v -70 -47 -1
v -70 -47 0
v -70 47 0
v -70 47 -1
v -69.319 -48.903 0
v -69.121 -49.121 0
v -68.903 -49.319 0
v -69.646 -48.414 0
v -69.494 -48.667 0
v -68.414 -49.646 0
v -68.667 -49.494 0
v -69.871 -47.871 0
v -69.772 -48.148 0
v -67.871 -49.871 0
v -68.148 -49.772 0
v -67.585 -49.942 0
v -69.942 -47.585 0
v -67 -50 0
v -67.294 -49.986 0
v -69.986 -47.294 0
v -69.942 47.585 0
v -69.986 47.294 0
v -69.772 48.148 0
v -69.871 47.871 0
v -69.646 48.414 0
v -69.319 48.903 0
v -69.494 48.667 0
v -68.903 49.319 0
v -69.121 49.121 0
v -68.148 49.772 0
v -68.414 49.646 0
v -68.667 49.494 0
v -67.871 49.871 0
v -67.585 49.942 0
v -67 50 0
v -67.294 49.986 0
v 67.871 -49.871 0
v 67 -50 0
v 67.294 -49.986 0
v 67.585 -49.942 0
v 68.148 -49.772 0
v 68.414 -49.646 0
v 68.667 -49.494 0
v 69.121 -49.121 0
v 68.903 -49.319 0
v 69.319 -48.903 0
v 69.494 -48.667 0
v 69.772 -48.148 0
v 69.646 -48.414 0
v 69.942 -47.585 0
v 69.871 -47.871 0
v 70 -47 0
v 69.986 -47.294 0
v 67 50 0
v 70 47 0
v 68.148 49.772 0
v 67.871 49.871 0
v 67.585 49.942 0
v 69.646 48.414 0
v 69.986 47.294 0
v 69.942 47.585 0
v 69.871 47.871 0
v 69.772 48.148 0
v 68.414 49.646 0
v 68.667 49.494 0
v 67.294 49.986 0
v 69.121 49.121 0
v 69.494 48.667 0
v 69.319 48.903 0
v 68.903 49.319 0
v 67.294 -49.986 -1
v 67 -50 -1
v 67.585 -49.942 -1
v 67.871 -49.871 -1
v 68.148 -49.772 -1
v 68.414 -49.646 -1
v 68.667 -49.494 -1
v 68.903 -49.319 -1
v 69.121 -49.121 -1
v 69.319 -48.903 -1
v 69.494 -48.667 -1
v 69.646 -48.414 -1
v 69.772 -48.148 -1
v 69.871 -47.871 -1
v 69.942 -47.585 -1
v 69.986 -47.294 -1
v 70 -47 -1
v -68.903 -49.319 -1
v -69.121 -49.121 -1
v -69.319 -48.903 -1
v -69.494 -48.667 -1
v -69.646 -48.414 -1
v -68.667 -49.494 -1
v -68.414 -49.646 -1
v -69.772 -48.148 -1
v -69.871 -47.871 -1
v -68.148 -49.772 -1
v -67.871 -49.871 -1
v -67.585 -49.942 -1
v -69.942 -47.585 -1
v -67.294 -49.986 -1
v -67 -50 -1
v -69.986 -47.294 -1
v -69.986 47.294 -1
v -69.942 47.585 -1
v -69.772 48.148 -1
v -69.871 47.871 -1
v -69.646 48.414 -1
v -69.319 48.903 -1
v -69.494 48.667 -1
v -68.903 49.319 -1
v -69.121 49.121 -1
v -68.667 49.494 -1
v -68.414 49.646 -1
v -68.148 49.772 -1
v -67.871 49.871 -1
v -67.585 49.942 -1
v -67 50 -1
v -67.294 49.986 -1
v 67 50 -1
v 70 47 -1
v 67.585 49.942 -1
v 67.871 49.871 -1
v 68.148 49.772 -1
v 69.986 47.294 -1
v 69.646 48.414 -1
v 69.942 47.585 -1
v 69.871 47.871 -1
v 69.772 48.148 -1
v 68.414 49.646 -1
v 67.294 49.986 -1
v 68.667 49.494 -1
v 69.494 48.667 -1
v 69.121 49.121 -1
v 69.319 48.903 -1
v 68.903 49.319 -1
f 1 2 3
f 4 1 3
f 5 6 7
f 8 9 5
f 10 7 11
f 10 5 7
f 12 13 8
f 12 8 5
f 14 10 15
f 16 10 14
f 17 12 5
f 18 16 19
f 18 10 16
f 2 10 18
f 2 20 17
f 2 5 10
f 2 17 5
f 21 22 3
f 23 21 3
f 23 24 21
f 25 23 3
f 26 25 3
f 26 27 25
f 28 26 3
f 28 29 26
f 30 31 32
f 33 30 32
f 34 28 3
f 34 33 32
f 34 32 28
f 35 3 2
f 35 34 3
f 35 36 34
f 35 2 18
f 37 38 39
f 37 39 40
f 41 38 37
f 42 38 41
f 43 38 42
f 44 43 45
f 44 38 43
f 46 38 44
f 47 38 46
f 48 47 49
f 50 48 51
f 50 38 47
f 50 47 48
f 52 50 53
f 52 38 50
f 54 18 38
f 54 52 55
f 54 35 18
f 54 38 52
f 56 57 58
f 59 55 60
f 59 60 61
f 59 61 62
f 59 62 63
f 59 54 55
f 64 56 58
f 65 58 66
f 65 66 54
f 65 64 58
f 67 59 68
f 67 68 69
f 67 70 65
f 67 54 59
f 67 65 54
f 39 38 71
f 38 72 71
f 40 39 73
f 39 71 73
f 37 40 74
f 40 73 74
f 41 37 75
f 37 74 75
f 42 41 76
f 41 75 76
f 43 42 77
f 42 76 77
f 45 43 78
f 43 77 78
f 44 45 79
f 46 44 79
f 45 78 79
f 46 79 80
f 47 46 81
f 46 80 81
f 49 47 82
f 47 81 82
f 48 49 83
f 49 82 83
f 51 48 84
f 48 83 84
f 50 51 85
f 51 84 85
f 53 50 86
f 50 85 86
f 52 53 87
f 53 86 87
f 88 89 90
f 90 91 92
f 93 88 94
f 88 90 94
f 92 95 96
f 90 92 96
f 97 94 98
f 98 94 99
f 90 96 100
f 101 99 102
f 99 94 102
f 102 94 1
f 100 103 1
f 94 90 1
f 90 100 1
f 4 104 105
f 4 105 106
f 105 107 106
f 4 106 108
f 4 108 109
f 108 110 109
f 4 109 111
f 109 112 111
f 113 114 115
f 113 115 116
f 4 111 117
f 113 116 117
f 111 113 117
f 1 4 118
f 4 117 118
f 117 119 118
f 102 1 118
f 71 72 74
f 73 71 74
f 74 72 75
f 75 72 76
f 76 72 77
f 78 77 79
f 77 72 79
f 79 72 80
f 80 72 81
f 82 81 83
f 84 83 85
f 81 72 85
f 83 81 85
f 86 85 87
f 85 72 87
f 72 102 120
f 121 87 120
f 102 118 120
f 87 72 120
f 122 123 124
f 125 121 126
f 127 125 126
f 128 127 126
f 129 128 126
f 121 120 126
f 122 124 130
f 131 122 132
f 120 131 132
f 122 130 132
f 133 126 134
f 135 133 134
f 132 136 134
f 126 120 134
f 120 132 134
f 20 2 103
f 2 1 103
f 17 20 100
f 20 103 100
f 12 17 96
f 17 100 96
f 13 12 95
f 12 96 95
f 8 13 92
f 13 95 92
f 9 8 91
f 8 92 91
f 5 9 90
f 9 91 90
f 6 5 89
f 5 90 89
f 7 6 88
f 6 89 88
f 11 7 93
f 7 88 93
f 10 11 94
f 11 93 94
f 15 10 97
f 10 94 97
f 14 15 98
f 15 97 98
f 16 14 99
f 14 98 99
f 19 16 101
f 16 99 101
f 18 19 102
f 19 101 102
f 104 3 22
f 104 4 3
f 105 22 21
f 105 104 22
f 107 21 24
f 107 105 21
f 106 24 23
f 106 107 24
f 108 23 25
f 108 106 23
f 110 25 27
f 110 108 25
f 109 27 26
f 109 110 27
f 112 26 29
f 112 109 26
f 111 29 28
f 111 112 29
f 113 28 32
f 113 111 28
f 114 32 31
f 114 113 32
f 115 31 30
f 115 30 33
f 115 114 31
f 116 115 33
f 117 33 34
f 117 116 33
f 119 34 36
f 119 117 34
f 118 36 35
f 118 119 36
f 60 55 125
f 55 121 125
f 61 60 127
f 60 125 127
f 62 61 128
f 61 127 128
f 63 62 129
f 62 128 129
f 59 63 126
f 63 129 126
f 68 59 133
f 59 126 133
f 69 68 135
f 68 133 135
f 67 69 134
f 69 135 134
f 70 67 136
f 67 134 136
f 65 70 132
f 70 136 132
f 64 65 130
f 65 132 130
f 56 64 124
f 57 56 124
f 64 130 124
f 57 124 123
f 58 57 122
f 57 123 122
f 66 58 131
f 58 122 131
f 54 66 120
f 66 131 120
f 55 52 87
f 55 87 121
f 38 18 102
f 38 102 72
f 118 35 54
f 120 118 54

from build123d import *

# Parameters (mm, degrees)
SKIZZE1_W                       = 140
SKIZZE1_H                       = 100
AUFSATZ_LINEAR_AUSTRAGEN1_DEPTH = 1
VERRUNDUNG1_R                   = 3


with BuildPart() as part:
    # Skizze1 → Aufsatz-Linear austragen1 (new body)
    with BuildSketch(Plane.XY):
        Rectangle(SKIZZE1_W, SKIZZE1_H)
    extrude(amount=-AUFSATZ_LINEAR_AUSTRAGEN1_DEPTH)

    # Verrundung1
    verrundung1_edges = [part.edges().sort_by_distance(p)[0] for p in [
        (70, -50, -0.5),
        (-70, -50, -0.5),
        (-70, 50, -0.5),
        (70, 50, -0.5),
    ]]
    fillet(verrundung1_edges, radius=VERRUNDUNG1_R)


solid = part.part
